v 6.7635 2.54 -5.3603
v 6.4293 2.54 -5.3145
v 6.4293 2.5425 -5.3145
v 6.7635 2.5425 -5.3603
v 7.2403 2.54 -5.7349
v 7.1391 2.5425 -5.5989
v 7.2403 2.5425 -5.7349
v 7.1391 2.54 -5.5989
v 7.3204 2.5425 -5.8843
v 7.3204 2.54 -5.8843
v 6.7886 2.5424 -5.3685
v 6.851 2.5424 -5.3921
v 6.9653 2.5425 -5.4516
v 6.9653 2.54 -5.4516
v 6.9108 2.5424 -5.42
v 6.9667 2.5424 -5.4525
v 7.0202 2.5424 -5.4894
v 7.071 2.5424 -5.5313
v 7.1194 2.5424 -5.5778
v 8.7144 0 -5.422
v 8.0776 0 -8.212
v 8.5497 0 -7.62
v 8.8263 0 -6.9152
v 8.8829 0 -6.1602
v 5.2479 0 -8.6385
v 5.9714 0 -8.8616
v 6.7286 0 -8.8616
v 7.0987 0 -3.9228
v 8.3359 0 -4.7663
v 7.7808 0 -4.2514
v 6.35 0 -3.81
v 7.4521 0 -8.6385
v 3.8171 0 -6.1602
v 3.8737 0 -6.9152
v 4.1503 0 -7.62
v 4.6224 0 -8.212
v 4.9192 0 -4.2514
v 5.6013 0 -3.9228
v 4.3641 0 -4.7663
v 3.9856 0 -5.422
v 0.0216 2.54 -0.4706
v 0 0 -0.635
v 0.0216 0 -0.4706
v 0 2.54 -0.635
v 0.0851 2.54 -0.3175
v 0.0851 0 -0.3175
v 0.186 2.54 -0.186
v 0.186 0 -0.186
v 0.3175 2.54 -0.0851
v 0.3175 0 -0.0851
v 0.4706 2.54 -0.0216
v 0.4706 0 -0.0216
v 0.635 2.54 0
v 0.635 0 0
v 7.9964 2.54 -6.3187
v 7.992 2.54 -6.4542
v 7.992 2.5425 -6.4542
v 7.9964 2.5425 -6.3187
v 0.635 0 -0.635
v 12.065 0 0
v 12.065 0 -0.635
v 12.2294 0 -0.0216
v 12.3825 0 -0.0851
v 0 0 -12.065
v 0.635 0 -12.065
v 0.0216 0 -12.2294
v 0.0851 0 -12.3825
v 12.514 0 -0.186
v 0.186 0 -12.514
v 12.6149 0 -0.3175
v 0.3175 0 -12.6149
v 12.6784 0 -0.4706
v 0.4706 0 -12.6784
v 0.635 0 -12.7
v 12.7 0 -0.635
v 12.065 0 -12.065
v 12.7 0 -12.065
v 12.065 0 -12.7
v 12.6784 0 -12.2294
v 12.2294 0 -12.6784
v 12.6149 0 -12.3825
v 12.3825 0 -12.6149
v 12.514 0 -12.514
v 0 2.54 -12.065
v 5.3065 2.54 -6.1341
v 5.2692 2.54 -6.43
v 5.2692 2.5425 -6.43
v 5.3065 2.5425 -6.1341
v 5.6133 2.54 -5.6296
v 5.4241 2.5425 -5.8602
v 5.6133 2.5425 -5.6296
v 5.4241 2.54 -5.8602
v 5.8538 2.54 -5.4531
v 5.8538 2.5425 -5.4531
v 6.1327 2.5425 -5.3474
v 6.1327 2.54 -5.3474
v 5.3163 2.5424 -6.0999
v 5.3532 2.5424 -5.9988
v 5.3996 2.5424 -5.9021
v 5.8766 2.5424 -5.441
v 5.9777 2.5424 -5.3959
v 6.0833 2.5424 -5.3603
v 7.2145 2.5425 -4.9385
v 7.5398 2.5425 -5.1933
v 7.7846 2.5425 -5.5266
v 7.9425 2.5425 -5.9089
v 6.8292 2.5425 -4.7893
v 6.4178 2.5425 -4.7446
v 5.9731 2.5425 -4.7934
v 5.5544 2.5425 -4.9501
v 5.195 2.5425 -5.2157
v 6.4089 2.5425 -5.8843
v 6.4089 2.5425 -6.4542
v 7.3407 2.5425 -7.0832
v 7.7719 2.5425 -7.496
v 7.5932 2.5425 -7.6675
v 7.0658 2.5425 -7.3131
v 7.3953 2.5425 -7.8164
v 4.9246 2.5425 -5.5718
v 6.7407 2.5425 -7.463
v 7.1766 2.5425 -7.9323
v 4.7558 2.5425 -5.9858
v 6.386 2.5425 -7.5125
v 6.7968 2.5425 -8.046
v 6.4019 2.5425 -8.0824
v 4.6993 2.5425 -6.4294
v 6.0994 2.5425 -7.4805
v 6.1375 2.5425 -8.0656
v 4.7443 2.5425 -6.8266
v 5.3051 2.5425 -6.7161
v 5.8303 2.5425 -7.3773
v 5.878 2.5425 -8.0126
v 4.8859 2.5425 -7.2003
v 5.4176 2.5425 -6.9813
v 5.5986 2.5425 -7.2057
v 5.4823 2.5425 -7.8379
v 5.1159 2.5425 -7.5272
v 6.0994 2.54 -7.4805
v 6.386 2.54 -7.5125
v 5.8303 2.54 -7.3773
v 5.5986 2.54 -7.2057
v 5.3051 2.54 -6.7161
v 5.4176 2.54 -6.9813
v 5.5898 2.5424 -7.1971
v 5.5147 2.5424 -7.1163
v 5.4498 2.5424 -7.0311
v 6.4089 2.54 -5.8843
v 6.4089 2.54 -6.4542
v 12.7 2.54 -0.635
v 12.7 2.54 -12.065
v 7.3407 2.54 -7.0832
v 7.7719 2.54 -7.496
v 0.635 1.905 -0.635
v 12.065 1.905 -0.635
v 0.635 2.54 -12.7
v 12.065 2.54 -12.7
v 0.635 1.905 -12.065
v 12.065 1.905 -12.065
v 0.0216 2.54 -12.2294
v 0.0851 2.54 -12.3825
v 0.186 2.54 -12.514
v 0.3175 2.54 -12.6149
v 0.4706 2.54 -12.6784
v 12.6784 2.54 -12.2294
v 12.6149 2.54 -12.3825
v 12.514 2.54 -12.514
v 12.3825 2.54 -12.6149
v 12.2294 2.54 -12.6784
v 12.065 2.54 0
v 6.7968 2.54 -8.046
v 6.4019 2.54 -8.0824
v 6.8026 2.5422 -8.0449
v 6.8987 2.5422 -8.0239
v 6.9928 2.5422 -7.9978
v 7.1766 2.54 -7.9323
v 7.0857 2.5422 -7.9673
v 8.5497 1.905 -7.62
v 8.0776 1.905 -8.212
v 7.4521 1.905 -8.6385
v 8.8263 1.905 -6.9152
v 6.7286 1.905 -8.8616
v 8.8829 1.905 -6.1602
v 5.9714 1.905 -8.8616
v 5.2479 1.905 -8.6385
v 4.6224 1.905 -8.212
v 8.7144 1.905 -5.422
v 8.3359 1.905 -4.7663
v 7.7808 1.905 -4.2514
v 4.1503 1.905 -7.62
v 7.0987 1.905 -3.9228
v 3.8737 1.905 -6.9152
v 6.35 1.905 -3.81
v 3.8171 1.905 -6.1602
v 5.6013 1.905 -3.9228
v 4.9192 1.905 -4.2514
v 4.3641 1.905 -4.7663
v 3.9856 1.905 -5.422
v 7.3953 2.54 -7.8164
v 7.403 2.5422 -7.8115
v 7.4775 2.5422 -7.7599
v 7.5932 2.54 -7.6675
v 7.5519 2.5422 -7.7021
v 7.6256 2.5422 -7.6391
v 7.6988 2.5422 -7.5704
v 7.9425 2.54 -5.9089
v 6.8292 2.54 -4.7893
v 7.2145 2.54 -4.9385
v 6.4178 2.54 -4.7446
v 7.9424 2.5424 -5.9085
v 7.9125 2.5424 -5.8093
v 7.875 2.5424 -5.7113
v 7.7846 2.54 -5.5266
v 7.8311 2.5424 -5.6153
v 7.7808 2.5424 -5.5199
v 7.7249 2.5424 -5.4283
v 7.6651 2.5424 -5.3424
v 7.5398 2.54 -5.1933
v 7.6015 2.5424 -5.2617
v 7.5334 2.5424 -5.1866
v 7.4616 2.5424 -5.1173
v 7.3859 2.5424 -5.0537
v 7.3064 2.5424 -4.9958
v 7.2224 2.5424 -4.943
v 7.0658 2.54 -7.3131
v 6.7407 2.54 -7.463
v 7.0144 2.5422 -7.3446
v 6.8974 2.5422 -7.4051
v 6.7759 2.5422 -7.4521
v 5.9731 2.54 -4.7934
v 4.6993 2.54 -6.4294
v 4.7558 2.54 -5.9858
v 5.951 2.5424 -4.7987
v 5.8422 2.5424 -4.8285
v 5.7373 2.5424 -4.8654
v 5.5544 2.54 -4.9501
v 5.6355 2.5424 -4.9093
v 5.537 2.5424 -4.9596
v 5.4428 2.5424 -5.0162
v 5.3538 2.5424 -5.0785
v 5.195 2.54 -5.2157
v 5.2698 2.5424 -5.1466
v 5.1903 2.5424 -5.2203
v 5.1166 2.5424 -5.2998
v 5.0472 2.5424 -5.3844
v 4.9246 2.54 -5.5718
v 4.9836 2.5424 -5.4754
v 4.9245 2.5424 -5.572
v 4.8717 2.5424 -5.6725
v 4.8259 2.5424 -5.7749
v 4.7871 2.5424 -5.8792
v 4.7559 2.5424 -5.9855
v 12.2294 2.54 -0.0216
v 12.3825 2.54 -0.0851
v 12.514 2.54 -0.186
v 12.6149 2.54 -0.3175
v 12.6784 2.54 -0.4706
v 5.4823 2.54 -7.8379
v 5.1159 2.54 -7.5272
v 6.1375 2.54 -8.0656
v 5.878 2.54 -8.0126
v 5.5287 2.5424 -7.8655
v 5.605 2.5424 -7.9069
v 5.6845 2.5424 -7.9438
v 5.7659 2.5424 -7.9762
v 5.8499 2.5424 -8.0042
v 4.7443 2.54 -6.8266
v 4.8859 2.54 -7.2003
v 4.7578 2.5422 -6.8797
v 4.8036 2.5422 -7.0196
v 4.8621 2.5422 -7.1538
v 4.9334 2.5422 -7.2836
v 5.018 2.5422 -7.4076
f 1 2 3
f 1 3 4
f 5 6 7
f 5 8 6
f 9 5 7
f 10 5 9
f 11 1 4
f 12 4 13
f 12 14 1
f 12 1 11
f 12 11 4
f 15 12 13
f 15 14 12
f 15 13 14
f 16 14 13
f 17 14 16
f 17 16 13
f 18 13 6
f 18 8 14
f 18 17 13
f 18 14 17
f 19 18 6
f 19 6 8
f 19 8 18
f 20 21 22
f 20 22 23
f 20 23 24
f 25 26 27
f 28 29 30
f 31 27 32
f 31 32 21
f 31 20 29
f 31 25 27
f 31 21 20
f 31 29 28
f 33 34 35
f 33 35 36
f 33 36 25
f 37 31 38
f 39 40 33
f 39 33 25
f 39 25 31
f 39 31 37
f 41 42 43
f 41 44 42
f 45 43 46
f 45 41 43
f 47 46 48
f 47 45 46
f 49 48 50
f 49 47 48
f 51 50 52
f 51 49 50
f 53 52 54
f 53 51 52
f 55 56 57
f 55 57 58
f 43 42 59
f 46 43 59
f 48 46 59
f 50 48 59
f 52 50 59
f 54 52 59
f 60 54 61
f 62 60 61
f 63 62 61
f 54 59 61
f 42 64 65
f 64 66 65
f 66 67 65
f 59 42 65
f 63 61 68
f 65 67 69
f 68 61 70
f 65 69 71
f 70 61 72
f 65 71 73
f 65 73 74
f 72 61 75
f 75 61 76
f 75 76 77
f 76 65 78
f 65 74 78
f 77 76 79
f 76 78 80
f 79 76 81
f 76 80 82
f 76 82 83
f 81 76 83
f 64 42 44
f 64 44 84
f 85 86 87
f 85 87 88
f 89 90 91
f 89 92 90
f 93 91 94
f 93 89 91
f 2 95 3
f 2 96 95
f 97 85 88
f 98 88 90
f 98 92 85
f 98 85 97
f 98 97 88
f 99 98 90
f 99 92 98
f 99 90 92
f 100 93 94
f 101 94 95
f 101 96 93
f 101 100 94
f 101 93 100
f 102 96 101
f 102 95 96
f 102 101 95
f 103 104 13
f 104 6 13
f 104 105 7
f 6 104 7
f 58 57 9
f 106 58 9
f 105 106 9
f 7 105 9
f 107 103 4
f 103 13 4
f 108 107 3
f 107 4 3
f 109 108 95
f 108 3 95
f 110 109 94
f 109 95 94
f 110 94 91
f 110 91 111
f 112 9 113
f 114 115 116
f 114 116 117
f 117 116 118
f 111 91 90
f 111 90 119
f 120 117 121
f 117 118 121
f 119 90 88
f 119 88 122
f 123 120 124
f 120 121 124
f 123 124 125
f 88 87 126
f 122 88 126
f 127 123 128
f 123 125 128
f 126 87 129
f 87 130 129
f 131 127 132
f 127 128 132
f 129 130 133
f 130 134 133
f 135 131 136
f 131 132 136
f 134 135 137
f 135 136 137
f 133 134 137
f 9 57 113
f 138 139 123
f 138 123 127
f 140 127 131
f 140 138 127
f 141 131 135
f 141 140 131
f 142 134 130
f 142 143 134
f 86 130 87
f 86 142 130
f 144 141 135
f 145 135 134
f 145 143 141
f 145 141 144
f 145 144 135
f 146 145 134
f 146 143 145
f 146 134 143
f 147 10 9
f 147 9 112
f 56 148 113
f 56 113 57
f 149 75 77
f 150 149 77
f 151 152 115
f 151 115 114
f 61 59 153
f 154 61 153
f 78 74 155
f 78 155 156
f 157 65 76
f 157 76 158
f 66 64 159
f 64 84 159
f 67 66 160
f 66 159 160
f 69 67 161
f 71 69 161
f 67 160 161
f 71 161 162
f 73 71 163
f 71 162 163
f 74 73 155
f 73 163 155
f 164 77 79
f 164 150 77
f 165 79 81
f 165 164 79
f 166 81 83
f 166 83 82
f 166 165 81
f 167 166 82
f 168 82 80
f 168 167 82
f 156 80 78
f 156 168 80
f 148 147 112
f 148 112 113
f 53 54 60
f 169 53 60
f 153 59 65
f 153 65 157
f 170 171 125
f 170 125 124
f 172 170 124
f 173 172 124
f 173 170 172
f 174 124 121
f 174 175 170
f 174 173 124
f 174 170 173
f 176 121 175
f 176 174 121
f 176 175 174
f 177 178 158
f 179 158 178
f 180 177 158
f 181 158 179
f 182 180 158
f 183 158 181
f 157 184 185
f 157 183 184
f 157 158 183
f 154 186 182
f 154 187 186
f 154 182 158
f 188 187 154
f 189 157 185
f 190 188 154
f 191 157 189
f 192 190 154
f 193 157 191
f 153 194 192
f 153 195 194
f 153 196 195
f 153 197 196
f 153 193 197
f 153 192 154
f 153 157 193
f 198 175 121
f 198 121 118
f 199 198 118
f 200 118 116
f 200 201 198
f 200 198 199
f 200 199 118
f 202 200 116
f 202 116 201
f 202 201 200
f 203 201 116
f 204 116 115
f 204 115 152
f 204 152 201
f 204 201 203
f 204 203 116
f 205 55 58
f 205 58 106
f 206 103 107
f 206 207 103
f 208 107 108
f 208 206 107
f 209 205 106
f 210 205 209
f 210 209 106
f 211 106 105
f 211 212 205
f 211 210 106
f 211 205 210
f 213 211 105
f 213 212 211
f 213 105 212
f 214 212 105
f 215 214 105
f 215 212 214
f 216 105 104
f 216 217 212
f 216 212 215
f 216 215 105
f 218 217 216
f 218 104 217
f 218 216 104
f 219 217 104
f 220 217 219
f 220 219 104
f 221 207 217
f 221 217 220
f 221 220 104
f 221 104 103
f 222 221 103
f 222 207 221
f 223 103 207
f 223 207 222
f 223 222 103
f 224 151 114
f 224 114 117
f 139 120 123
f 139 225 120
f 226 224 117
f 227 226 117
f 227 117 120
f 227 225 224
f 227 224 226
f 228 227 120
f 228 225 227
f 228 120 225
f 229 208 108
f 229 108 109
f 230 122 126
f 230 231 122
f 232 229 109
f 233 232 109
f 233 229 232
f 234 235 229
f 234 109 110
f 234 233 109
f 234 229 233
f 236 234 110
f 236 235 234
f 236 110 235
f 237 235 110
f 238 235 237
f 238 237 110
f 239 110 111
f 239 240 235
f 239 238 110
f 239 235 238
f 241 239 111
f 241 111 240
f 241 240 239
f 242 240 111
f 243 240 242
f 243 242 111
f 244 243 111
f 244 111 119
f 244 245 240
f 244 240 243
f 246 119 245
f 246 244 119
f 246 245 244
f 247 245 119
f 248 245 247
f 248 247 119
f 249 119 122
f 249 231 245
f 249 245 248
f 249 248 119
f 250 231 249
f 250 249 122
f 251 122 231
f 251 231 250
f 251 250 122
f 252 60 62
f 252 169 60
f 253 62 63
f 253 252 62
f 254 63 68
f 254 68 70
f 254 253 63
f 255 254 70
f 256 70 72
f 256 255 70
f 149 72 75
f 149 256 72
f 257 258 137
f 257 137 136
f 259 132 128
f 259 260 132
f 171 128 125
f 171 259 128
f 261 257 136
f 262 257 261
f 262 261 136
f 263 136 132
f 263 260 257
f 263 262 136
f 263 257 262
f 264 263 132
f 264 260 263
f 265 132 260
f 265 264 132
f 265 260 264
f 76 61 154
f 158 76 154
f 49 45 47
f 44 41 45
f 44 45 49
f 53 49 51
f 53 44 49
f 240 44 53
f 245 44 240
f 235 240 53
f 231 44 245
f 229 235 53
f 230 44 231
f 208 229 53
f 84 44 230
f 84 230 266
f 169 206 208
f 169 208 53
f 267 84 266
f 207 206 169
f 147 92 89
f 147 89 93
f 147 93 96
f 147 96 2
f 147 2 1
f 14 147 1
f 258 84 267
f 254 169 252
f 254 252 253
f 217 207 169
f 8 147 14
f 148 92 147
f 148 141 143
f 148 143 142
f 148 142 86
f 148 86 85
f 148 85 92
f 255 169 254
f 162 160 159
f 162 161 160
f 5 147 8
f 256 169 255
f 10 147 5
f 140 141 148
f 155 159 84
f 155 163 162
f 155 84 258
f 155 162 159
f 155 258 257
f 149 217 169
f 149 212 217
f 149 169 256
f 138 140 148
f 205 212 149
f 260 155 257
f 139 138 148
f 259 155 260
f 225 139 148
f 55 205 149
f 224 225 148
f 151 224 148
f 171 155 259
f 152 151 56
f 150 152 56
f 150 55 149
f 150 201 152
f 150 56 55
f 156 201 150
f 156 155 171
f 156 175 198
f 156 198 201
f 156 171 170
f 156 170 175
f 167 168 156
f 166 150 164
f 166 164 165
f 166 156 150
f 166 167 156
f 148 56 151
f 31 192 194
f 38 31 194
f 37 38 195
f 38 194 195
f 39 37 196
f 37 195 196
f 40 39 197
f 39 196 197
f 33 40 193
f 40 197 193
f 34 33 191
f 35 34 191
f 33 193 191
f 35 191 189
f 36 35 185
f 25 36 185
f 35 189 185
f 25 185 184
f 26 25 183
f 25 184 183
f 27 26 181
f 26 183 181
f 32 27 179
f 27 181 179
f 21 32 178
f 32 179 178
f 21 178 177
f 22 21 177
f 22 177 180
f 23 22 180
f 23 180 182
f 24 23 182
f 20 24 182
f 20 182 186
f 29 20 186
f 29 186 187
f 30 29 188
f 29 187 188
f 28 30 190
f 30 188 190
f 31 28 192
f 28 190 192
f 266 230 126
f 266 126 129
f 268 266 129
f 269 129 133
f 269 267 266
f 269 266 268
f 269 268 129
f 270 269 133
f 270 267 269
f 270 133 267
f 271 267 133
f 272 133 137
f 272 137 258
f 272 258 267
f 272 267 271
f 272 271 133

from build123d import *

# Parameters (mm, degrees)
SKETCH1_W           = 12.7
SKETCH1_H           = 12.7
BOSS_EXTRUDE1_DEPTH = 2.54
FILLET1_R           = 0.635
SHELL1_START        = 0.635
SHELL1_OUTLINE_W    = 1.905
SHELL1_OUTLINE_H    = 11.43
SHELL1_DEPTH        = 11.43
SKETCH2_R           = 2.54
BOSS_EXTRUDE2_DEPTH = 1.905
BOSS_EXTRUDE3_DEPTH = 0.00254


# Read off the part's stored shape, not the designer's step: Shell1
with BuildPart() as part:
    # Sketch1 → Boss-Extrude1 (new body)
    with BuildSketch(Plane(origin=(0, 0, 0), x_dir=(1, 0, 0), z_dir=(0, 1, 0))):
        with Locations((6.35, 6.35)):
            Rectangle(SKETCH1_W, SKETCH1_H)
    extrude(amount=BOSS_EXTRUDE1_DEPTH)

    # Fillet1
    fillet1_edges = [part.edges().sort_by_distance(p)[0] for p in [
        (0, 1.27, -12.7),
        (12.7, 1.27, -12.7),
        (12.7, 1.27, 0),
        (0, 1.27, 0),
    ]]
    fillet(fillet1_edges, radius=FILLET1_R)

    # Shell1 outline → Shell1 (cut)
    with BuildSketch(Plane.YZ.offset(SHELL1_START)):
        with Locations((0.9525, -6.35)):
            Rectangle(SHELL1_OUTLINE_W, SHELL1_OUTLINE_H)
    extrude(amount=SHELL1_DEPTH, mode=Mode.SUBTRACT)

    # Sketch2 → Boss-Extrude2 (add)
    with BuildSketch(Plane(origin=(0, 1.905, 0), x_dir=(-1, 0, 0), z_dir=(0, -1, 0))):
        with Locations(Location((-6.35, 6.35, 0), (0, 0, 270))):
            Circle(SKETCH2_R)
    extrude(amount=BOSS_EXTRUDE2_DEPTH)

    # Sketch3 → Boss-Extrude3 (add)
    with BuildSketch(Plane(origin=(0, 2.54, 0), x_dir=(1, 0, 0), z_dir=(0, 1, 0))):
        with BuildLine():
            Line((7.771926803, 7.496002003), (7.340706851, 7.083226562))
            add(Edge.make_bspline(
                [(7.340706851, 7.083226562), (7.306566415, 7.117407905), (7.239577243, 7.184477342), (7.130024832, 7.271772823), (7.016561783, 7.345991239), (6.898814643, 7.407018813), (6.776619389, 7.454357105), (6.650217166, 7.4882197), (6.519402332, 7.508304178), (6.430846529, 7.511115937), (6.386044391, 7.512538462)],
                knots=[0, 0, 0, 0, 1.075575784, 2.110457258, 3.113929901, 4.09197124, 5.059417775, 6.02750972, 7.002078037, 8, 8, 8, 8], degree=3))
            add(Edge.make_bspline(
                [(6.386044391, 7.512538462), (6.347202307, 7.511541705), (6.270932472, 7.509584486), (6.158861293, 7.494721502), (6.051770417, 7.469893554), (5.949153902, 7.435498578), (5.851638258, 7.390739844), (5.758658459, 7.33630815), (5.670786706, 7.271787088), (5.588714925, 7.198399755), (5.513988304, 7.118275604), (5.448748017, 7.03251443), (5.39317731, 6.942714749), (5.347431283, 6.848417132), (5.312623532, 6.749766307), (5.287775353, 6.64683389), (5.272002938, 6.539919017), (5.270140687, 6.466980583), (5.269197436, 6.430036458)],
                knots=[0, 0, 0, 0, 1.075001177, 2.110859044, 3.123021556, 4.114053297, 5.101481495, 6.087880186, 7.091499647, 8.114004866, 9.131394192, 10.11971144, 11.092043119, 12.050101265, 13.015322563, 13.981809771, 14.977764287, 16, 16, 16, 16], degree=3))
            add(Edge.make_bspline(
                [(5.269197436, 6.430036458), (5.270077255, 6.391813648), (5.271810619, 6.316509478), (5.288461543, 6.205997372), (5.314115158, 6.099676762), (5.35166521, 5.998336523), (5.397877952, 5.900588436), (5.456483323, 5.808325972), (5.52482305, 5.720140184), (5.602775019, 5.637566437), (5.687566632, 5.561453315), (5.779398707, 5.495796177), (5.87547715, 5.439148239), (5.977352671, 5.394284903), (6.083257013, 5.358264559), (6.19426435, 5.332867125), (6.31012472, 5.317285888), (6.389175206, 5.31541236), (6.42929359, 5.314461538)],
                knots=[0, 0, 0, 0, 1.022067601, 2.013613092, 2.983553406, 3.943623673, 4.90013463, 5.87121881, 6.861774014, 7.881098904, 8.905697761, 9.905387765, 10.89678721, 11.884561068, 12.87834324, 13.885584958, 14.926927371, 16, 16, 16, 16], degree=3))
            add(Edge.make_bspline(
                [(6.42929359, 5.314461538), (6.455389112, 5.314696994), (6.50662043, 5.315159245), (6.581768042, 5.322662884), (6.653741405, 5.333390208), (6.722819251, 5.347591911), (6.78830408, 5.367689869), (6.851102574, 5.391191957), (6.910846789, 5.418929106), (6.967212798, 5.4518583), (7.021039491, 5.488767902), (7.07182304, 5.531000335), (7.120454247, 5.577603414), (7.166364864, 5.629146461), (7.20877784, 5.686090332), (7.249051978, 5.747388607), (7.286726148, 5.813649634), (7.308986821, 5.860439815), (7.320354287, 5.884333333)],
                knots=[0, 0, 0, 0, 1.109579412, 2.178351274, 3.208885622, 4.204702371, 5.174744997, 6.119429583, 7.05542196, 7.97267548, 8.893247984, 9.828544973, 10.778894627, 11.756245826, 12.760884819, 13.796418446, 14.874735809, 16, 16, 16, 16], degree=3))
            Line((7.320354287, 5.884333333), (6.408941026, 5.884333333))
            Line((6.408941026, 5.884333333), (6.408941026, 6.454205128))
            Line((6.408941026, 6.454205128), (7.991988902, 6.454205128))
            Line((7.991988902, 6.454205128), (7.996441026, 6.318733373))
            add(Edge.make_bspline(
                [(7.996441026, 6.318733373), (7.995868961, 6.283940789), (7.994725852, 6.214417712), (7.984279039, 6.110909693), (7.966974052, 6.008774494), (7.943316479, 5.908114696), (7.913667554, 5.808436526), (7.875855895, 5.710694487), (7.831578672, 5.614225725), (7.781969186, 5.519440156), (7.726222397, 5.428490826), (7.666202793, 5.342373816), (7.602765995, 5.261238176), (7.534532278, 5.18621433), (7.462564154, 5.116672044), (7.386719952, 5.052878855), (7.306731416, 4.994780786), (7.223022277, 4.941887042), (7.13511573, 4.895528796), (7.043495085, 4.855203272), (6.948298678, 4.820955656), (6.849280734, 4.792880061), (6.746636094, 4.771217506), (6.64036256, 4.756363463), (6.530401766, 4.746269974), (6.455817686, 4.745156592), (6.417845272, 4.744589744)],
                knots=[0, 0, 0, 0, 1.006889344, 2.011981806, 3.007738725, 4.003571281, 5.003404394, 6.015442001, 7.03424805, 8.074616296, 9.110249922, 10.119753985, 11.111721717, 12.089233633, 13.052717867, 14.006597561, 14.955430184, 15.912305663, 16.870361111, 17.829300583, 18.807640451, 19.796414044, 20.806216501, 21.841577364, 22.90109906, 24, 24, 24, 24], degree=3))
            add(Edge.make_bspline(
                [(6.417845272, 4.744589744), (6.377331282, 4.745149516), (6.297020469, 4.746259153), (6.178270169, 4.756651657), (6.062964889, 4.773803815), (5.951075868, 4.797541814), (5.842343325, 4.827085651), (5.736954077, 4.864170155), (5.635123675, 4.908283344), (5.536547184, 4.958257086), (5.442484518, 5.014931662), (5.353146488, 5.077313277), (5.269020717, 5.145803203), (5.189245497, 5.219254905), (5.115684686, 5.299473831), (5.045596958, 5.383859699), (4.982377825, 5.475507443), (4.923309052, 5.571445818), (4.870831882, 5.671634621), (4.824939843, 5.774220808), (4.785803137, 5.878610404), (4.754942899, 5.985289482), (4.729887276, 6.093514186), (4.711959507, 6.203755162), (4.701834859, 6.315998608), (4.70016576, 6.391432018), (4.699325641, 6.429400441)],
                knots=[0, 0, 0, 0, 1.084149091, 2.14910686, 3.187506334, 4.202448172, 5.208724393, 6.201130722, 7.189831603, 8.176984443, 9.156919086, 10.126598231, 11.090766514, 12.05840148, 13.026036446, 14.001772938, 14.991905635, 16.003017641, 17.015720547, 18.016462227, 19.009322657, 19.99686681, 20.986544154, 21.980959929, 22.983742515, 24, 24, 24, 24], degree=3))
            add(Edge.make_bspline(
                [(4.699325641, 6.429400441), (4.70045074, 6.481197483), (4.702672477, 6.583481286), (4.72324913, 6.734145976), (4.755325067, 6.87989903), (4.801357267, 7.020209626), (4.860427449, 7.155271043), (4.931698831, 7.285400345), (5.016719582, 7.410459214), (5.082531483, 7.487888023), (5.115917187, 7.527166867)],
                knots=[0, 0, 0, 0, 1.034044851, 2.041932006, 3.031217818, 4.011390712, 4.986069675, 5.97149666, 6.970960976, 8, 8, 8, 8], degree=3))
            add(Edge.make_bspline(
                [(5.115917187, 7.527166867), (5.136646046, 7.549890869), (5.177792517, 7.59499767), (5.243565077, 7.657674489), (5.311005647, 7.716593018), (5.381048291, 7.770503925), (5.453324806, 7.820587348), (5.528043218, 7.865904431), (5.604811571, 7.907898096), (5.684228565, 7.944423986), (5.765878441, 7.977172494), (5.850122815, 8.004882336), (5.936330711, 8.02942667), (6.025265506, 8.048098613), (6.116028744, 8.063647182), (6.209264693, 8.074068647), (6.304719281, 8.081706839), (6.369279964, 8.082173929), (6.401944832, 8.082410256)],
                knots=[0, 0, 0, 0, 1.020590567, 2.025856924, 3.013483481, 3.991664875, 4.957826714, 5.930500614, 6.890802512, 7.860442893, 8.829981142, 9.809047939, 10.802672283, 11.803273349, 12.823572789, 13.857849586, 14.916166035, 16, 16, 16, 16], degree=3))
            add(Edge.make_bspline(
                [(6.401944832, 8.082410256), (6.436090224, 8.081883676), (6.504027016, 8.080835974), (6.605037776, 8.073586558), (6.704644924, 8.062402419), (6.802428705, 8.045625571), (6.898717283, 8.024936226), (6.993012244, 7.998428055), (7.085928747, 7.968309997), (7.146417038, 7.944297656), (7.176614303, 7.932310096)],
                knots=[0, 0, 0, 0, 1.03180557, 2.052914215, 3.058998889, 4.059601663, 5.049854447, 6.033765722, 7.018406786, 8, 8, 8, 8], degree=3))
            add(Edge.make_bspline(
                [(7.176614303, 7.932310096), (7.202021565, 7.921231433), (7.253699235, 7.898697739), (7.328883874, 7.857471289), (7.40425221, 7.811767038), (7.47899098, 7.759913932), (7.552986303, 7.70200896), (7.62701077, 7.638966722), (7.70030871, 7.570052109), (7.747744937, 7.521005039), (7.771926803, 7.496002003)],
                knots=[0, 0, 0, 0, 0.894392155, 1.819168899, 2.76525314, 3.739198753, 4.75366411, 5.797420238, 6.877176959, 8, 8, 8, 8], degree=3))
        make_face()
    extrude(amount=BOSS_EXTRUDE3_DEPTH)


solid = part.part
